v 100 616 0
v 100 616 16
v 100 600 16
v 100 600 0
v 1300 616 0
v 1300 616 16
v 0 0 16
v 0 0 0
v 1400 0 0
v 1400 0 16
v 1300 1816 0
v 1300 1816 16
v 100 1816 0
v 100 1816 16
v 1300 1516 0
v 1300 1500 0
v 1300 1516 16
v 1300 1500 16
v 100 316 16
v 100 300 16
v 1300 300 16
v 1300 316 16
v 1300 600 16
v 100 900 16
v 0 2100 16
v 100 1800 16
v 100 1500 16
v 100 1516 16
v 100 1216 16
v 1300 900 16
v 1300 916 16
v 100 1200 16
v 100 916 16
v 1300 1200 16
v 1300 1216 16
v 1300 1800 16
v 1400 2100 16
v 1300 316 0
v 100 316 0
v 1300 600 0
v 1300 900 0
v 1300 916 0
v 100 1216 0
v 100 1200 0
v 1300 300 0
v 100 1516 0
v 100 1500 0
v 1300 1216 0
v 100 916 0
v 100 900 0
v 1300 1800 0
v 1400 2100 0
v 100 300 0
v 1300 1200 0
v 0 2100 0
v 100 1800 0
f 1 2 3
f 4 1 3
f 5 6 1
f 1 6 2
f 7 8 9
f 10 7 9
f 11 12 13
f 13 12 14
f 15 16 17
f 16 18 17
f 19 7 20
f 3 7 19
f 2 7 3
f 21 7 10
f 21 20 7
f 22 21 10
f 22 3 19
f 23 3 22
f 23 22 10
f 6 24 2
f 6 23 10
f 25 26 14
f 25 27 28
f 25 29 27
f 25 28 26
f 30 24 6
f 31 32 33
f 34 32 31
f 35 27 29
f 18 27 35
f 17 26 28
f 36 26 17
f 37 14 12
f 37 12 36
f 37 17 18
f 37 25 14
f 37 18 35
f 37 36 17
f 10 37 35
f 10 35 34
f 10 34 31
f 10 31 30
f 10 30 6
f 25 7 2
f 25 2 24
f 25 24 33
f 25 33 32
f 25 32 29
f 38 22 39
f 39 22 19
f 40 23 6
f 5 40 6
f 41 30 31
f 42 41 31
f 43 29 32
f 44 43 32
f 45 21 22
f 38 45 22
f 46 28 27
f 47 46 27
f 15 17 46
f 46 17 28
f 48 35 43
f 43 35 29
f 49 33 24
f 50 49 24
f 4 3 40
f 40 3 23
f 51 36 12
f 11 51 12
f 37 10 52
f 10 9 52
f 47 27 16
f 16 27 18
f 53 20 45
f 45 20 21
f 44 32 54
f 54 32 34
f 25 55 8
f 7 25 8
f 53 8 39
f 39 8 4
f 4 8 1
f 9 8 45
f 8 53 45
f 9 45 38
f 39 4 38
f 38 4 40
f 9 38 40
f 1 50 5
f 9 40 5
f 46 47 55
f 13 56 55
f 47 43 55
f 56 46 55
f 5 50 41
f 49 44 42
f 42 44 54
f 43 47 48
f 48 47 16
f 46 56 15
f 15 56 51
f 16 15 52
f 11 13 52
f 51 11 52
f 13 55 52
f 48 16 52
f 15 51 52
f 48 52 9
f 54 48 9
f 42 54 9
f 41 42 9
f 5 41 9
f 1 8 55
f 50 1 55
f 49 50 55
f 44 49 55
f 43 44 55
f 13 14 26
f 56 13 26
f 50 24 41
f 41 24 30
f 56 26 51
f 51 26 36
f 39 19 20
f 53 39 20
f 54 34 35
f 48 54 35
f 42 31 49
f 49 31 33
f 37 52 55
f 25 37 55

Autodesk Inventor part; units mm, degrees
ref_plane "YZ Plane" through (0, 0, 0) normal (1, 0, 0) x (0, 1, 0)
ref_plane "XZ Plane" through (0, 0, 0) normal (0, 1, 0) x (-1, 0, 0)
ref_plane "XY Plane" through (0, 0, 0) normal (0, 0, 1) x (1, 0, 0)
sketch "Sketch1" plane through (0, 0, 0) normal (0, 0, 1) x (1, 0, 0)
  line L0 (0, 0) -> (1400, 0)
  line L1 (1400, 0) -> (1400, 2100)
  line L2 (1400, 2100) -> (0, 2100)
  line L3 (0, 2100) -> (0, 0)
  dimension "d0" = 1400
  dimension "d1" = 2100
extrude "Extrusion1" add sketch "Sketch1" along normal blind 16
sketch "Sketch2" plane through (0, 0, 16) normal (0, 0, 1) x (1, 0, 0)
  line L0 (1400, 0) -> (1400, 2100) projected
  line L1 (0, 2100) -> (0, 0) projected
  line L2 (0, 0) -> (1400, 0) projected
  line L3 (0, 0) -> (100, 0)
  line L4 (100, 0) -> (100, 300)
  line L5 (100, 300) -> (0, 300)
  line L6 (0, 300) -> (0, 0)
  line L7 (100, 300) -> (1300, 300)
  line L8 (1300, 300) -> (1300, 316)
  line L9 (1300, 316) -> (100, 316)
  line L10 (100, 316) -> (100, 300)
  line L11 (100, 600) -> (1300, 600)
  line L12 (1300, 616) -> (100, 616)
  line L13 (100, 616) -> (100, 600)
  line L14 (1300, 600) -> (1300, 616)
  line L15 (100, 900) -> (1300, 900)
  line L16 (1300, 916) -> (100, 916)
  line L17 (100, 916) -> (100, 900)
  line L18 (1300, 900) -> (1300, 916)
  line L19 (100, 1200) -> (1300, 1200)
  line L20 (1300, 1216) -> (100, 1216)
  line L21 (100, 1216) -> (100, 1200)
  line L22 (1300, 1200) -> (1300, 1216)
  line L23 (100, 1500) -> (1300, 1500)
  line L24 (1300, 1516) -> (100, 1516)
  line L25 (100, 1516) -> (100, 1500)
  line L26 (1300, 1500) -> (1300, 1516)
  line L27 (100, 1800) -> (1300, 1800)
  line L28 (1300, 1816) -> (100, 1816)
  line L29 (100, 1816) -> (100, 1800)
  line L30 (1300, 1800) -> (1300, 1816)
  dimension "d4" = 1400
  dimension "d5" = 100
  dimension "d6" = 300
  dimension "d7" = 1200
  dimension "d8" = 16
  dimension "d13" = 300
extrude "Extrusion2" cut sketch "Sketch2" against normal blind 16 contours L10 L9 L8 L7 | L13 L12 L14 L11 | L17 L16 L18 L15 | L21 L20 L22 L19 | L25 L24 L26 L23 | L29 L28 L30 L27
properties part number "panel"
